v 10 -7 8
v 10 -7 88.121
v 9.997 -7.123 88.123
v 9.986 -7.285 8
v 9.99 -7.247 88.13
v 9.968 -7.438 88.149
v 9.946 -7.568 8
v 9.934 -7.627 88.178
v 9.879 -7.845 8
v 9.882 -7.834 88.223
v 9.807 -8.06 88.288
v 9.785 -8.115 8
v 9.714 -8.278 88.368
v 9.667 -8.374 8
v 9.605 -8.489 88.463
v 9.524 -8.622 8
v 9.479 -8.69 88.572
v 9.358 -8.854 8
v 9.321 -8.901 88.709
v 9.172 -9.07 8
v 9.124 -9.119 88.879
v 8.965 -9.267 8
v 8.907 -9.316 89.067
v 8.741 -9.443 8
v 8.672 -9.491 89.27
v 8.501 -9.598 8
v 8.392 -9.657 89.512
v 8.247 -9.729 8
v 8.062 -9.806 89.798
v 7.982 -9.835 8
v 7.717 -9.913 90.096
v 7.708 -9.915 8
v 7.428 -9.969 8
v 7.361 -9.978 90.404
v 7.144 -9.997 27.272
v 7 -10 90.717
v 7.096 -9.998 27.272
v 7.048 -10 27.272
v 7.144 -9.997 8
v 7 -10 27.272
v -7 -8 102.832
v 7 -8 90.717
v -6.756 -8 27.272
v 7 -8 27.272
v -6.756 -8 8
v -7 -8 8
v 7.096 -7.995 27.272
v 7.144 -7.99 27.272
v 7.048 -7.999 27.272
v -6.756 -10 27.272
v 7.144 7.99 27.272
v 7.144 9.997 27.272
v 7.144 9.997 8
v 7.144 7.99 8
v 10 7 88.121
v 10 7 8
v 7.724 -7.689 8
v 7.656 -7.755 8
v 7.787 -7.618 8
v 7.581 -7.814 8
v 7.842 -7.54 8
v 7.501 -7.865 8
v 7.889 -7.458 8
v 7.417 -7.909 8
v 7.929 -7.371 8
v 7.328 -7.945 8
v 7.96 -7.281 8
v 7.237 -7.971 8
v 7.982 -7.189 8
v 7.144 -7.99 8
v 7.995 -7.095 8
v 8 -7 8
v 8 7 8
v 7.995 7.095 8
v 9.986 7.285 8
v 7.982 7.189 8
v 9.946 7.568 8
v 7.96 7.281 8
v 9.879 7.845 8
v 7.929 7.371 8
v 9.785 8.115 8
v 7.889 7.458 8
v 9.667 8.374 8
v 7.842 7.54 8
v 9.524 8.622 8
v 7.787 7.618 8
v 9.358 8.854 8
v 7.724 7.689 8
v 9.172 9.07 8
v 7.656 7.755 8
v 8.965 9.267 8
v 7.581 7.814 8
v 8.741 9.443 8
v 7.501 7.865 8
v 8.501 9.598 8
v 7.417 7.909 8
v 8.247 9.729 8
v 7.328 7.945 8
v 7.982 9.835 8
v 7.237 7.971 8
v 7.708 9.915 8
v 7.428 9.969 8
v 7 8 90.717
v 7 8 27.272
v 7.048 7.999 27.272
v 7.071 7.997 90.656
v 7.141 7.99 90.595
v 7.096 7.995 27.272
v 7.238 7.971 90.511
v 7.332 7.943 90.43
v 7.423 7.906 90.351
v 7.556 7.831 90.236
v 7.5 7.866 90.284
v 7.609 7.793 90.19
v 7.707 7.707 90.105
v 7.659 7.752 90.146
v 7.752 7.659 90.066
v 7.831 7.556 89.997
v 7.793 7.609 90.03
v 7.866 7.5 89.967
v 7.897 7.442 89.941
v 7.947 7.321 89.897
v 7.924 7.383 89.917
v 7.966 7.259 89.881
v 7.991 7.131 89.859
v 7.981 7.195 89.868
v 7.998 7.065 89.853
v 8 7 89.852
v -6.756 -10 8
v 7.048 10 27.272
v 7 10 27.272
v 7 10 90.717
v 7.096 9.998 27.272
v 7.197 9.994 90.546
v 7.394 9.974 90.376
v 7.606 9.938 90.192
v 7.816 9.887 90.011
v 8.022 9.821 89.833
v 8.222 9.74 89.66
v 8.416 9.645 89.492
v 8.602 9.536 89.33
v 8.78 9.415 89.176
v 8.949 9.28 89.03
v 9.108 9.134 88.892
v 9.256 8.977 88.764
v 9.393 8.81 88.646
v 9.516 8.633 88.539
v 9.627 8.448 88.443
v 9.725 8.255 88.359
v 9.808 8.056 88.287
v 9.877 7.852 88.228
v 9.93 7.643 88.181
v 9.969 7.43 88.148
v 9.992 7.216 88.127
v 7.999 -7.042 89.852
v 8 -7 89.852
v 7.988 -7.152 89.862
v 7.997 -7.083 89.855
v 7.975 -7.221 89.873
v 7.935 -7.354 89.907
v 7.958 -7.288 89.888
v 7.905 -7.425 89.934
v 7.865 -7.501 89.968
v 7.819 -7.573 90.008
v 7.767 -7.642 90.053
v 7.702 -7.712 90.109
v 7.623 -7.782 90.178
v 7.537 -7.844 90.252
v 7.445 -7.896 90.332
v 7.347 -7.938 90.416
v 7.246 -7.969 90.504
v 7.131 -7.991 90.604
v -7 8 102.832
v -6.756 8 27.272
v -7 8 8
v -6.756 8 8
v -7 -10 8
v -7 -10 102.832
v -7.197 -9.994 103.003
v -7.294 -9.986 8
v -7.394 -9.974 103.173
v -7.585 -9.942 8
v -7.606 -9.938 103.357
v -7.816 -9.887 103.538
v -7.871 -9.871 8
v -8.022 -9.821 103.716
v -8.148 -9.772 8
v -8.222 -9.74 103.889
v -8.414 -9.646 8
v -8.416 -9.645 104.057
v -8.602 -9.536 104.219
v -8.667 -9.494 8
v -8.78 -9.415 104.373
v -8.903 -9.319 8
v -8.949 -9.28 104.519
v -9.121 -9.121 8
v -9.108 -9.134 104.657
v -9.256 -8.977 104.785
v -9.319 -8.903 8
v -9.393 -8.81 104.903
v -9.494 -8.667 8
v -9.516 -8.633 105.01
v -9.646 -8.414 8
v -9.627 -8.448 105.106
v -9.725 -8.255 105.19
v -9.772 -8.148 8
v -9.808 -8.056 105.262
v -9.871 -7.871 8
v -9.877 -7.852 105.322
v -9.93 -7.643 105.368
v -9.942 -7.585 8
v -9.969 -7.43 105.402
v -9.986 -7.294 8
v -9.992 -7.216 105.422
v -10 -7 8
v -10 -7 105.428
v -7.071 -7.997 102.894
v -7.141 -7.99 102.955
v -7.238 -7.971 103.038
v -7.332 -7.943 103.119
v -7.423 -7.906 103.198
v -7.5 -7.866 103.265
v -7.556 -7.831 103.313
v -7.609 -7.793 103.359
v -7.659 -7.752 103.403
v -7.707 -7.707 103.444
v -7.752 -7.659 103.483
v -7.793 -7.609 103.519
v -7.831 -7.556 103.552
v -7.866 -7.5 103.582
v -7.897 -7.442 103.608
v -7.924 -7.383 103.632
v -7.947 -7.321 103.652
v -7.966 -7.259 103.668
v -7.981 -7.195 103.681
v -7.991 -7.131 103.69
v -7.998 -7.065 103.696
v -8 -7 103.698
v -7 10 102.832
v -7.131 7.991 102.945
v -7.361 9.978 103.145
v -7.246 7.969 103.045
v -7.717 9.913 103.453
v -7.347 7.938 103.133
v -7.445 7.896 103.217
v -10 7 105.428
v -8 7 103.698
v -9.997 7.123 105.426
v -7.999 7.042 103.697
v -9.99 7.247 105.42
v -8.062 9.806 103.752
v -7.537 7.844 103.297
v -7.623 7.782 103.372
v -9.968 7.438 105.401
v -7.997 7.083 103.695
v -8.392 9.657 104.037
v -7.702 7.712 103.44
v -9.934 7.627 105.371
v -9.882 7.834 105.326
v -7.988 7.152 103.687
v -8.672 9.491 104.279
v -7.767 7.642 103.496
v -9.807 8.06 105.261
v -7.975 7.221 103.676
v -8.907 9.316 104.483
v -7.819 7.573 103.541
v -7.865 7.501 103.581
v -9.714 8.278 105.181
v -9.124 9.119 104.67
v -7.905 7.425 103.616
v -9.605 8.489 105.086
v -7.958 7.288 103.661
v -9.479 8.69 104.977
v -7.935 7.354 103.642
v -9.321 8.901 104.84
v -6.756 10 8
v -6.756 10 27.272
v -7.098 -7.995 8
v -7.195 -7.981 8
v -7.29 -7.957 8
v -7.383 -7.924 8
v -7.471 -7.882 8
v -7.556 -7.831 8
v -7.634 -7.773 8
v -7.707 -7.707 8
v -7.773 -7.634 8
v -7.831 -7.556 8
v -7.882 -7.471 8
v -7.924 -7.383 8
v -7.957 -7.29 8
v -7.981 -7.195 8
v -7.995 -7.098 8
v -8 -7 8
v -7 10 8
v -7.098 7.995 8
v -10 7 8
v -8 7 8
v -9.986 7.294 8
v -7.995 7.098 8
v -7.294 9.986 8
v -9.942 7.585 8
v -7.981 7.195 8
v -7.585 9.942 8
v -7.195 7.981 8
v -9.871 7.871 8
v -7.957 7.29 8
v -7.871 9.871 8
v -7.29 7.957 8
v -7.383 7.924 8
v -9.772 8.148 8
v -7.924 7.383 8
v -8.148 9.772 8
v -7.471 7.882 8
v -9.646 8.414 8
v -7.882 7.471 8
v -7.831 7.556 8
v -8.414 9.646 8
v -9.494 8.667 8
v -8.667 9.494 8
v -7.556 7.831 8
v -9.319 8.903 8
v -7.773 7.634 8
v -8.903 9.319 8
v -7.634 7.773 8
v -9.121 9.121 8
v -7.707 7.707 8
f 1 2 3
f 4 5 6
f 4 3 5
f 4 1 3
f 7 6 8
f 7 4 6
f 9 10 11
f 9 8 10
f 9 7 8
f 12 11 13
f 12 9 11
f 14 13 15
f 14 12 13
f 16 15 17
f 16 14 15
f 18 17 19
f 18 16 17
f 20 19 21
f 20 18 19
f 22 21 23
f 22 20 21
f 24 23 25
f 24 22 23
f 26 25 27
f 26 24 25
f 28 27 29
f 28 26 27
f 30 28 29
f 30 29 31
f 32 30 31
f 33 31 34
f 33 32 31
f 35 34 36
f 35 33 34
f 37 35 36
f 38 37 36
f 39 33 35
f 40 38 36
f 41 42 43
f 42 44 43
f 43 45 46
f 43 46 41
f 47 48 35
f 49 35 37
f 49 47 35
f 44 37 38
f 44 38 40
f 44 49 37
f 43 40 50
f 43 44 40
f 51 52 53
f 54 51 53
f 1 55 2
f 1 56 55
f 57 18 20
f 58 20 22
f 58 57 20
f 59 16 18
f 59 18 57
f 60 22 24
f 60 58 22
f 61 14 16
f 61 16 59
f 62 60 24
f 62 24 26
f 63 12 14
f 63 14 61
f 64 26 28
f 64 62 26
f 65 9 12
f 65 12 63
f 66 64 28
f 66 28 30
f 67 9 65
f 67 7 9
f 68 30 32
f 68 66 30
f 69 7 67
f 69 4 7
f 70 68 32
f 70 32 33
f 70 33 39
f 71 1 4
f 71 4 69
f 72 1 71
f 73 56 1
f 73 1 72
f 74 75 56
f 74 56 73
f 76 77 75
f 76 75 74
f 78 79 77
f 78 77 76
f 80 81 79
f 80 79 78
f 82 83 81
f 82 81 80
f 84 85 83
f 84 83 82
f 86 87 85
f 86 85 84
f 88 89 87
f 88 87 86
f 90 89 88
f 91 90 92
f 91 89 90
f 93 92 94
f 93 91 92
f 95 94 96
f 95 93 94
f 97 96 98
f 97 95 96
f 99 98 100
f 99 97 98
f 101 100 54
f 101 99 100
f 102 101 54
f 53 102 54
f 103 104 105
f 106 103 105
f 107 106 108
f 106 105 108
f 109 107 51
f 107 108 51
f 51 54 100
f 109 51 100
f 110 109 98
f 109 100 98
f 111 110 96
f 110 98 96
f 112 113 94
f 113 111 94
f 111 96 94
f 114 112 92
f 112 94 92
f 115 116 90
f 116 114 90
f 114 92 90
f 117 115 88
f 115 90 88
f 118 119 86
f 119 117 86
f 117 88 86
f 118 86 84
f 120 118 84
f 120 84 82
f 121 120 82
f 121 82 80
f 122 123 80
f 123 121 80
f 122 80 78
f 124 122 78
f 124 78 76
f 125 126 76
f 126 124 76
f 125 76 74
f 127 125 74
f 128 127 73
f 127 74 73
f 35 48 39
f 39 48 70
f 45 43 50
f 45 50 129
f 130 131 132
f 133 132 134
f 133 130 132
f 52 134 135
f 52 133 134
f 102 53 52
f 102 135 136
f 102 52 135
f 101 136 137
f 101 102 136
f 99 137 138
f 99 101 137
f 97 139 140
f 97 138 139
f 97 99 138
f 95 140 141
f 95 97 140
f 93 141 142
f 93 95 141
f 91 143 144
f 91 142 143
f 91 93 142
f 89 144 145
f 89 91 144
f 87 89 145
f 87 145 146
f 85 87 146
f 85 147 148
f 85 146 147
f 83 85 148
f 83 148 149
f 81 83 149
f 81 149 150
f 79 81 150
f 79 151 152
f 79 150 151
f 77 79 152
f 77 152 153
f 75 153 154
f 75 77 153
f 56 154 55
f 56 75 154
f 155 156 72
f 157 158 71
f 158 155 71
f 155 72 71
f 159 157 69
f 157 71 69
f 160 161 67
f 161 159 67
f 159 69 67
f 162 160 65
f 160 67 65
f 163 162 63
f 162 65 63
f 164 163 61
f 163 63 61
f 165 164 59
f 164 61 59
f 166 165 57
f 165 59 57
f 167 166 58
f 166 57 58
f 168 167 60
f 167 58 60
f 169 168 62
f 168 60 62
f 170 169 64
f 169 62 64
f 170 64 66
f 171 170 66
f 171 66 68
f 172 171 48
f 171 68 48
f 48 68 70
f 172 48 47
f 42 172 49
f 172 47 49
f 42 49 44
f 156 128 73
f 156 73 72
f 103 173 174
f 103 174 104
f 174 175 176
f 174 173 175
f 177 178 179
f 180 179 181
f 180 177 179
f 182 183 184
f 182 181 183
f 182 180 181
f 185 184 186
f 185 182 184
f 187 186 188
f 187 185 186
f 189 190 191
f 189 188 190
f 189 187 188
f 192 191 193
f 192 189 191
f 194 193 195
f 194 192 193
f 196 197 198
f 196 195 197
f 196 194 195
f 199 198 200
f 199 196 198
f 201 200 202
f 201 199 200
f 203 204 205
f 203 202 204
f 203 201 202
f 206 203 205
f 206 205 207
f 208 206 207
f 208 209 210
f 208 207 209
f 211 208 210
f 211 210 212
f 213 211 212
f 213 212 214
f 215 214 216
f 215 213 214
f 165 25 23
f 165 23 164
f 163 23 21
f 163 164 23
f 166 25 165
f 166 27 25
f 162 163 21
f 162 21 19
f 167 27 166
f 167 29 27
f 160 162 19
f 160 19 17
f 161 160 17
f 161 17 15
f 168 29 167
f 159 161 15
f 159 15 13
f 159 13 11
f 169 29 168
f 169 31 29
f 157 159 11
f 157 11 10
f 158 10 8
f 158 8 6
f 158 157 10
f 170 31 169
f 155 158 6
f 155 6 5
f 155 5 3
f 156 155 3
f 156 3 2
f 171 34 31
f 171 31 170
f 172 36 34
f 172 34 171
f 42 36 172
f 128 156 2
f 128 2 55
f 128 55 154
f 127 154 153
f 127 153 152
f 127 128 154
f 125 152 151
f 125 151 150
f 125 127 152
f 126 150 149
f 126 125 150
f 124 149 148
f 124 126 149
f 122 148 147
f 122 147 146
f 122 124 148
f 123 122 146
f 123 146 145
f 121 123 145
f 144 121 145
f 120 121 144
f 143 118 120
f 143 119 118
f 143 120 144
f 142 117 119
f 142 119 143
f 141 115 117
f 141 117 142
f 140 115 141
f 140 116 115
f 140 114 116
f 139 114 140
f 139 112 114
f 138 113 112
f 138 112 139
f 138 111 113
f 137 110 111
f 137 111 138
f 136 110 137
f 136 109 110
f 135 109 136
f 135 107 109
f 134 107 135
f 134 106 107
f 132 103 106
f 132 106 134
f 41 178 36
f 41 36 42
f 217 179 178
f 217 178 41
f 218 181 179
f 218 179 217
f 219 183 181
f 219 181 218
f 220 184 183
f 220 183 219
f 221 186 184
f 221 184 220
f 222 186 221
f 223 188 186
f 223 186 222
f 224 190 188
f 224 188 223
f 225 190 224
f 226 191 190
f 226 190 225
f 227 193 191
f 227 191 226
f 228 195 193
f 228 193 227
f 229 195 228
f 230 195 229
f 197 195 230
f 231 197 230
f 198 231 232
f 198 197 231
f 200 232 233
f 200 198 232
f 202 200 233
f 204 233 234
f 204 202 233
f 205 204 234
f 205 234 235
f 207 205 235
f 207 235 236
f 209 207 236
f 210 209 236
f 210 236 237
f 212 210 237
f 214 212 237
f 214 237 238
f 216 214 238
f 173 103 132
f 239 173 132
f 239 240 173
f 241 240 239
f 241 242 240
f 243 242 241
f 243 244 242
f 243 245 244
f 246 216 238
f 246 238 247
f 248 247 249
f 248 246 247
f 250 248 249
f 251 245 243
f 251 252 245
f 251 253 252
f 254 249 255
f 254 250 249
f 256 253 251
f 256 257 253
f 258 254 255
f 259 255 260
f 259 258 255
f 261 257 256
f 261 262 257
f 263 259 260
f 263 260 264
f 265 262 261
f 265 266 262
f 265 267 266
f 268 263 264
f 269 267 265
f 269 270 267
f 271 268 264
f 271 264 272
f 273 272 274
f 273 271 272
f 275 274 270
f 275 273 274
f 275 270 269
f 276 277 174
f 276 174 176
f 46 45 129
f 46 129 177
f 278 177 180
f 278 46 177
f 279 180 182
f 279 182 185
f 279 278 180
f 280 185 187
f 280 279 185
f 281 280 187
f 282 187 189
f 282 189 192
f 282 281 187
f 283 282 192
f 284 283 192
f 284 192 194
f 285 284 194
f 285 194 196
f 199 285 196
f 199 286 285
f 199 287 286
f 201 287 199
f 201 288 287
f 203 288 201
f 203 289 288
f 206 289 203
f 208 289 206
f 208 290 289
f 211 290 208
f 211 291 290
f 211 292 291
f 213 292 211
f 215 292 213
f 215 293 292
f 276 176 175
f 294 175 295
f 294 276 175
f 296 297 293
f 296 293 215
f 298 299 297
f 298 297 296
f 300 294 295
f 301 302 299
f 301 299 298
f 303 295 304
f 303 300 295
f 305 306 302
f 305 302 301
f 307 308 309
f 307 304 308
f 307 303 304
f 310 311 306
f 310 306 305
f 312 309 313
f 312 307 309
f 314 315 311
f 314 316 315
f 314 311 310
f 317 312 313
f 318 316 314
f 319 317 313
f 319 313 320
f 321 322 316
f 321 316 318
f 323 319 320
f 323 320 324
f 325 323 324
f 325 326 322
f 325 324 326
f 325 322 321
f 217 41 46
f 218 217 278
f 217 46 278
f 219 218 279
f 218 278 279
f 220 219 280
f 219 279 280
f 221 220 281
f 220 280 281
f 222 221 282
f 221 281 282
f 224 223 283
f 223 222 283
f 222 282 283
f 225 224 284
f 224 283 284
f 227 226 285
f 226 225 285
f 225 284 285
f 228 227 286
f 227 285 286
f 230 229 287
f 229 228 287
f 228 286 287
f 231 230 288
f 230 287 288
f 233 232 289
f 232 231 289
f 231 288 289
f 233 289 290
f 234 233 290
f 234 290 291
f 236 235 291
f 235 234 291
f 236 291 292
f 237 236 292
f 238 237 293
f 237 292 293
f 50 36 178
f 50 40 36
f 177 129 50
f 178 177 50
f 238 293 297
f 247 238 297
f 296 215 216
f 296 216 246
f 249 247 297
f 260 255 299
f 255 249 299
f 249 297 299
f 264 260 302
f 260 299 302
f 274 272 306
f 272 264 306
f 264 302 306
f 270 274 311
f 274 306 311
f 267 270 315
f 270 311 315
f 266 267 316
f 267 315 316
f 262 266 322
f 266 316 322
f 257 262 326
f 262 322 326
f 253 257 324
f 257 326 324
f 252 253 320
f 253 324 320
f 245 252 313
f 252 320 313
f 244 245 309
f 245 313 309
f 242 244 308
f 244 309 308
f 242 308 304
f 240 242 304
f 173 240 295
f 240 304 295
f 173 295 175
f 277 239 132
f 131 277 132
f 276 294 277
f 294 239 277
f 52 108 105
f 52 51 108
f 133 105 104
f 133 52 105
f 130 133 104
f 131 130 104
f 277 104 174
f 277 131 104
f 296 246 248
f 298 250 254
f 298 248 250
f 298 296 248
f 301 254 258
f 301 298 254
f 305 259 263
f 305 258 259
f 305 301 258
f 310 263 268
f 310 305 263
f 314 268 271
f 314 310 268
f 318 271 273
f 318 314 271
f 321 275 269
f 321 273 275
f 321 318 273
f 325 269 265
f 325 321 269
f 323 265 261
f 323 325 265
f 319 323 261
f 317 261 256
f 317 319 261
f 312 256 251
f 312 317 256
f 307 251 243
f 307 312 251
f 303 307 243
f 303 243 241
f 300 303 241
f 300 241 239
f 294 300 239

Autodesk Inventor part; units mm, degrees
ref_plane "Start Plane" through (0, 0, 0) normal (0, 0, 1) x (1, 0, 0)
ref_plane "End Plane" through (0, 0, 105.4293) normal (0, 0, 1) x (1, 0, 0)
sketch "Sketch" plane through (0, 0, 0) normal (0, 0, 1) x (1, 0, 0)
  line L0 (-10, -7) -> (-10, 7)
  line L1 (-7, 10) -> (7, 10)
  line L2 (10, 7) -> (10, -7)
  line L3 (7, -10) -> (-7, -10)
  arc A0 (-10, -7) -> (-7, -10) centre (-7, -7) ccw
  arc A1 (-7, 10) -> (-10, 7) centre (-7, 7) ccw
  arc A2 (10, 7) -> (7, 10) centre (7, 7) ccw
  arc A3 (7, -10) -> (10, -7) centre (7, -7) ccw
  arc A4 (-7, 8) -> (-8, 7) centre (-7, 7) ccw
  line L4 (-7, 8) -> (7, 8)
  arc A5 (8, 7) -> (7, 8) centre (7, 7) ccw
  line L5 (8, 7) -> (8, -7)
  arc A6 (7, -8) -> (8, -7) centre (7, -7) ccw
  line L6 (7, -8) -> (-7, -8)
  arc A7 (-8, -7) -> (-7, -8) centre (-7, -7) ccw
  line L7 (-8, -7) -> (-8, 7)
  line L8 (0, 14.8698) -> (0, -14.8698) construction
  line L9 (-14.8698, 0) -> (14.8698, 0) construction
  dimension "d7" = 3
  dimension "d10" = 20
  dimension "d11" = 20
  dimension "d12" = 2
  dimension "d15" = 10
  dimension "d16" = 10
extrude "Body" add sketch "Sketch" along normal up to surface (105.4293 mm away) from surface at 0
sketch "Sketch3" plane through (0, 0, 0) normal (0, 0, 1) x (1, 0, 0)
  line L0 (0, 0) -> (10, 0)
ref_plane "Work Plane3" through (0, 0, 0) normal (0, -1, 0) x (1, 0, 0)
sketch "Sketch4" plane through (0, 0, 0) normal (0, -1, 0) x (1, 0, 0)
  line L0 (-2, 0) -> (12, 0)
  line L1 (-2, 105.4293) -> (12, 105.4293)
  dimension "d18" = 105.4293
ref_plane "Work Plane4" through (163.4562, -7, -44.6771) normal (0.6544, 0, 0.7562) x (0.7562, 0, -0.6544)
split "Split1" plane through (163.4562, -7, -44.6771) removes the side toward (0.6544, 0, 0.7562)
sketch "Sketch9" plane through (-7, 10, 0) normal (0, 1, 0) x (1, 0, 0)
  line L0 (0, -102.8331) -> (-3, -105.4293) projected
  line L1 (-3, 0) -> (-3, -105.4293) projected
  line L2 (0, -102.8331) -> (14, -90.7177) projected
  line L3 (17, -88.1216) -> (14, -90.7177) projected
  line L4 (17, 0) -> (17, -88.1216) projected
  line L5 (0, 0) -> (14, 0) projected
  line L6 (0, 0) -> (-3, 0) projected
  line L7 (17, 0) -> (14, 0) projected
  line L8 (0.3719, -13.6065) -> (0.3719, -23.9385) projected
  line L9 (13.8719, -23.9385) -> (13.8719, -13.6065) projected
  circle A0 centre (7.1219, -18.7725) radius 8.5 projected
  line L10 (14.1439, -13.9827) -> (14.1439, -23.5624)
  line L11 (0.2439, -23.7668) -> (0.2439, -13.7783)
  line L12 (14.1439, -13.9827) -> (14.1439, 0)
  line L13 (0.2439, -13.7783) -> (0.2439, 0)
  line L14 (17, 0) -> (17, -88.1216) projected
  line L15 (17, -67.4293) -> (-3, -67.4293)
  line L16 (-3, 0) -> (-3, -105.4293) projected
  line L17 (17, -86.1216) -> (-3, -86.1216)
  line L18 (14.1439, -23.5624) -> (14.1439, -27.2725)
  line L19 (14.1439, -27.2725) -> (0.2439, -27.2725)
  line L20 (0.2439, -27.2725) -> (0.2439, -23.7668)
  line L21 (17, -8) -> (-3, -8)
  point P0 (7, 0)
  point P1 (7.117, -27.2725)
  point P2 (14.1439, -7.7933)
  point P3 (17, -67.4293)
  point P4 (-3, -67.4293)
  point P5 (0.2439, -7.7933)
  point P6 (7.1219, -27.2725)
  point P7 (0.2439, -8)
  point P8 (14.1439, -8)
  point P9 (14.1439, -8)
  point P10 (0.2439, -8)
  dimension "d44" = 13.5
  dimension "d45" = 13.9
  dimension "d47" = 2
  dimension "d49" = 38
  dimension "d53" = 8
extrude "Extrusion8" cut sketch "Sketch9" against normal through all contours L1 L6 L5 L13 L21 | L21 L12 A0 L13 | L13 L5 L7 L12 L21 | L21 L12 L7 L4 | A0 L8 L11 | A0 L9 L8 | A0 L19 L20 | L10 A0 L9 | L18 L19 A0
equation "\"d7\" = G_IR"
equation "\"d10\" = G_H"
equation "\"d11\" = G_W"
equation "\"d12\" = G_T"
equation "\"d15\" = 0.5 * d10"
equation "\"d16\" = 0.5 * d11"
equation "\"d3\" = G_L"
equation "\"G_W\" = 20"
equation "\"G_H\" = 20"
equation "\"G_T\" = 2"
equation "\"G_IR\" = 3"
equation "\"G_L\" = d18"
equation "\"G_OFFSET_START\" = 0"
equation "\"G_OFFSET_END\" = -4.57072"
equation "\"d14\" = G_OFFSET_END + B_L"
equation "\"B_L\" = 110"
properties part number "ISO 12633-2 - 20x20x2 - 105,43" material "Steel, Mild"
